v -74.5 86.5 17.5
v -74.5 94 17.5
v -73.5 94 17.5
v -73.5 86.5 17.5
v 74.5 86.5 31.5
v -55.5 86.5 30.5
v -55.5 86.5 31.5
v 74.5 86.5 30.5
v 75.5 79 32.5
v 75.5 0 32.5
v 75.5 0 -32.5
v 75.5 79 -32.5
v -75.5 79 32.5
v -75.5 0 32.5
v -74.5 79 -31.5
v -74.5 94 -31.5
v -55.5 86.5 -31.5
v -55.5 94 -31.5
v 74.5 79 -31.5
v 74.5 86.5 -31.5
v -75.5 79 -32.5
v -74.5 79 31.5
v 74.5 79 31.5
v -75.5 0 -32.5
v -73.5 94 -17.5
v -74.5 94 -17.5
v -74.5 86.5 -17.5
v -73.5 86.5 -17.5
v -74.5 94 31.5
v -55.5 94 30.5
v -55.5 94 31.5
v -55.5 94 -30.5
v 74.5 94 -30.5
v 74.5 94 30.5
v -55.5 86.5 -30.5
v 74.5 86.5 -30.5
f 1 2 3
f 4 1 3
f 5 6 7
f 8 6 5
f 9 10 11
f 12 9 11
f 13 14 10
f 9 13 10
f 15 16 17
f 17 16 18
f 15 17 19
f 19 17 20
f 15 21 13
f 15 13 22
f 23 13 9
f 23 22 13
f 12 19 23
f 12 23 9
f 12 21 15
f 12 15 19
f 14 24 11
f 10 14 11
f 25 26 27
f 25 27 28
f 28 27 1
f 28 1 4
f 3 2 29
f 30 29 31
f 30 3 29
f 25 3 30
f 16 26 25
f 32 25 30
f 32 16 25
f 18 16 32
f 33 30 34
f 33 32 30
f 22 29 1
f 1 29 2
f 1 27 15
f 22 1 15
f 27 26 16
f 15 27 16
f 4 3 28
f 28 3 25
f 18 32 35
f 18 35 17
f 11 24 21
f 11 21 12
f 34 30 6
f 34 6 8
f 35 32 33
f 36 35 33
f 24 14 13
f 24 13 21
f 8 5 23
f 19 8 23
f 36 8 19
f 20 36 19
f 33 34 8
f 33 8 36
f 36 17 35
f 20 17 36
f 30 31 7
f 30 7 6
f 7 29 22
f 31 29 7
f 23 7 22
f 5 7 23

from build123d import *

# Parameters (mm, degrees)
SKETCH1_W           = 151
SKETCH1_H           = 65
BOSS_EXTRUDE1_DEPTH = 94
SKETCH2_W           = 151
SKETCH2_H           = 65
SKETCH2_W_2         = 149
SKETCH2_H_2         = 63
CUT_EXTRUDE1_DEPTH  = 15
SKETCH3_W           = 130
SKETCH3_H           = 1
CUT_EXTRUDE2_DEPTH  = 7.5
SKETCH4_W           = 1
SKETCH4_H           = 35
CUT_EXTRUDE3_DEPTH  = 7.5


with BuildPart() as part:
    # Sketch1 → Boss-Extrude1 (new body)
    with BuildSketch(Plane(origin=(0, 0, 0), x_dir=(1, 0, 0), z_dir=(0, 1, 0))):
        Rectangle(SKETCH1_W, SKETCH1_H)
    extrude(amount=BOSS_EXTRUDE1_DEPTH)

    # Sketch2 → Cut-Extrude1 (cut)
    with BuildSketch(Plane(origin=(0, 94, 0), x_dir=(1, 0, 0), z_dir=(0, 1, 0))):
        Rectangle(SKETCH2_W, SKETCH2_H)
        Rectangle(SKETCH2_W_2, SKETCH2_H_2, mode=Mode.SUBTRACT)
    extrude(amount=-CUT_EXTRUDE1_DEPTH, mode=Mode.SUBTRACT)

    # Sketch3 → Cut-Extrude2 (cut)
    with BuildSketch(Plane(origin=(0, 94, 0), x_dir=(1, 0, 0), z_dir=(0, 1, 0))):
        with Locations((9.5, 31)):
            Rectangle(SKETCH3_W, SKETCH3_H)
        with Locations((9.5, -31)):
            Rectangle(SKETCH3_W, SKETCH3_H)
    extrude(amount=-CUT_EXTRUDE2_DEPTH, mode=Mode.SUBTRACT)

    # Sketch4 → Cut-Extrude3 (cut)
    with BuildSketch(Plane(origin=(0, 94, 0), x_dir=(1, 0, 0), z_dir=(0, 1, 0))):
        with Locations((-74, 0)):
            Rectangle(SKETCH4_W, SKETCH4_H)
    extrude(amount=-CUT_EXTRUDE3_DEPTH, mode=Mode.SUBTRACT)


solid = part.part
